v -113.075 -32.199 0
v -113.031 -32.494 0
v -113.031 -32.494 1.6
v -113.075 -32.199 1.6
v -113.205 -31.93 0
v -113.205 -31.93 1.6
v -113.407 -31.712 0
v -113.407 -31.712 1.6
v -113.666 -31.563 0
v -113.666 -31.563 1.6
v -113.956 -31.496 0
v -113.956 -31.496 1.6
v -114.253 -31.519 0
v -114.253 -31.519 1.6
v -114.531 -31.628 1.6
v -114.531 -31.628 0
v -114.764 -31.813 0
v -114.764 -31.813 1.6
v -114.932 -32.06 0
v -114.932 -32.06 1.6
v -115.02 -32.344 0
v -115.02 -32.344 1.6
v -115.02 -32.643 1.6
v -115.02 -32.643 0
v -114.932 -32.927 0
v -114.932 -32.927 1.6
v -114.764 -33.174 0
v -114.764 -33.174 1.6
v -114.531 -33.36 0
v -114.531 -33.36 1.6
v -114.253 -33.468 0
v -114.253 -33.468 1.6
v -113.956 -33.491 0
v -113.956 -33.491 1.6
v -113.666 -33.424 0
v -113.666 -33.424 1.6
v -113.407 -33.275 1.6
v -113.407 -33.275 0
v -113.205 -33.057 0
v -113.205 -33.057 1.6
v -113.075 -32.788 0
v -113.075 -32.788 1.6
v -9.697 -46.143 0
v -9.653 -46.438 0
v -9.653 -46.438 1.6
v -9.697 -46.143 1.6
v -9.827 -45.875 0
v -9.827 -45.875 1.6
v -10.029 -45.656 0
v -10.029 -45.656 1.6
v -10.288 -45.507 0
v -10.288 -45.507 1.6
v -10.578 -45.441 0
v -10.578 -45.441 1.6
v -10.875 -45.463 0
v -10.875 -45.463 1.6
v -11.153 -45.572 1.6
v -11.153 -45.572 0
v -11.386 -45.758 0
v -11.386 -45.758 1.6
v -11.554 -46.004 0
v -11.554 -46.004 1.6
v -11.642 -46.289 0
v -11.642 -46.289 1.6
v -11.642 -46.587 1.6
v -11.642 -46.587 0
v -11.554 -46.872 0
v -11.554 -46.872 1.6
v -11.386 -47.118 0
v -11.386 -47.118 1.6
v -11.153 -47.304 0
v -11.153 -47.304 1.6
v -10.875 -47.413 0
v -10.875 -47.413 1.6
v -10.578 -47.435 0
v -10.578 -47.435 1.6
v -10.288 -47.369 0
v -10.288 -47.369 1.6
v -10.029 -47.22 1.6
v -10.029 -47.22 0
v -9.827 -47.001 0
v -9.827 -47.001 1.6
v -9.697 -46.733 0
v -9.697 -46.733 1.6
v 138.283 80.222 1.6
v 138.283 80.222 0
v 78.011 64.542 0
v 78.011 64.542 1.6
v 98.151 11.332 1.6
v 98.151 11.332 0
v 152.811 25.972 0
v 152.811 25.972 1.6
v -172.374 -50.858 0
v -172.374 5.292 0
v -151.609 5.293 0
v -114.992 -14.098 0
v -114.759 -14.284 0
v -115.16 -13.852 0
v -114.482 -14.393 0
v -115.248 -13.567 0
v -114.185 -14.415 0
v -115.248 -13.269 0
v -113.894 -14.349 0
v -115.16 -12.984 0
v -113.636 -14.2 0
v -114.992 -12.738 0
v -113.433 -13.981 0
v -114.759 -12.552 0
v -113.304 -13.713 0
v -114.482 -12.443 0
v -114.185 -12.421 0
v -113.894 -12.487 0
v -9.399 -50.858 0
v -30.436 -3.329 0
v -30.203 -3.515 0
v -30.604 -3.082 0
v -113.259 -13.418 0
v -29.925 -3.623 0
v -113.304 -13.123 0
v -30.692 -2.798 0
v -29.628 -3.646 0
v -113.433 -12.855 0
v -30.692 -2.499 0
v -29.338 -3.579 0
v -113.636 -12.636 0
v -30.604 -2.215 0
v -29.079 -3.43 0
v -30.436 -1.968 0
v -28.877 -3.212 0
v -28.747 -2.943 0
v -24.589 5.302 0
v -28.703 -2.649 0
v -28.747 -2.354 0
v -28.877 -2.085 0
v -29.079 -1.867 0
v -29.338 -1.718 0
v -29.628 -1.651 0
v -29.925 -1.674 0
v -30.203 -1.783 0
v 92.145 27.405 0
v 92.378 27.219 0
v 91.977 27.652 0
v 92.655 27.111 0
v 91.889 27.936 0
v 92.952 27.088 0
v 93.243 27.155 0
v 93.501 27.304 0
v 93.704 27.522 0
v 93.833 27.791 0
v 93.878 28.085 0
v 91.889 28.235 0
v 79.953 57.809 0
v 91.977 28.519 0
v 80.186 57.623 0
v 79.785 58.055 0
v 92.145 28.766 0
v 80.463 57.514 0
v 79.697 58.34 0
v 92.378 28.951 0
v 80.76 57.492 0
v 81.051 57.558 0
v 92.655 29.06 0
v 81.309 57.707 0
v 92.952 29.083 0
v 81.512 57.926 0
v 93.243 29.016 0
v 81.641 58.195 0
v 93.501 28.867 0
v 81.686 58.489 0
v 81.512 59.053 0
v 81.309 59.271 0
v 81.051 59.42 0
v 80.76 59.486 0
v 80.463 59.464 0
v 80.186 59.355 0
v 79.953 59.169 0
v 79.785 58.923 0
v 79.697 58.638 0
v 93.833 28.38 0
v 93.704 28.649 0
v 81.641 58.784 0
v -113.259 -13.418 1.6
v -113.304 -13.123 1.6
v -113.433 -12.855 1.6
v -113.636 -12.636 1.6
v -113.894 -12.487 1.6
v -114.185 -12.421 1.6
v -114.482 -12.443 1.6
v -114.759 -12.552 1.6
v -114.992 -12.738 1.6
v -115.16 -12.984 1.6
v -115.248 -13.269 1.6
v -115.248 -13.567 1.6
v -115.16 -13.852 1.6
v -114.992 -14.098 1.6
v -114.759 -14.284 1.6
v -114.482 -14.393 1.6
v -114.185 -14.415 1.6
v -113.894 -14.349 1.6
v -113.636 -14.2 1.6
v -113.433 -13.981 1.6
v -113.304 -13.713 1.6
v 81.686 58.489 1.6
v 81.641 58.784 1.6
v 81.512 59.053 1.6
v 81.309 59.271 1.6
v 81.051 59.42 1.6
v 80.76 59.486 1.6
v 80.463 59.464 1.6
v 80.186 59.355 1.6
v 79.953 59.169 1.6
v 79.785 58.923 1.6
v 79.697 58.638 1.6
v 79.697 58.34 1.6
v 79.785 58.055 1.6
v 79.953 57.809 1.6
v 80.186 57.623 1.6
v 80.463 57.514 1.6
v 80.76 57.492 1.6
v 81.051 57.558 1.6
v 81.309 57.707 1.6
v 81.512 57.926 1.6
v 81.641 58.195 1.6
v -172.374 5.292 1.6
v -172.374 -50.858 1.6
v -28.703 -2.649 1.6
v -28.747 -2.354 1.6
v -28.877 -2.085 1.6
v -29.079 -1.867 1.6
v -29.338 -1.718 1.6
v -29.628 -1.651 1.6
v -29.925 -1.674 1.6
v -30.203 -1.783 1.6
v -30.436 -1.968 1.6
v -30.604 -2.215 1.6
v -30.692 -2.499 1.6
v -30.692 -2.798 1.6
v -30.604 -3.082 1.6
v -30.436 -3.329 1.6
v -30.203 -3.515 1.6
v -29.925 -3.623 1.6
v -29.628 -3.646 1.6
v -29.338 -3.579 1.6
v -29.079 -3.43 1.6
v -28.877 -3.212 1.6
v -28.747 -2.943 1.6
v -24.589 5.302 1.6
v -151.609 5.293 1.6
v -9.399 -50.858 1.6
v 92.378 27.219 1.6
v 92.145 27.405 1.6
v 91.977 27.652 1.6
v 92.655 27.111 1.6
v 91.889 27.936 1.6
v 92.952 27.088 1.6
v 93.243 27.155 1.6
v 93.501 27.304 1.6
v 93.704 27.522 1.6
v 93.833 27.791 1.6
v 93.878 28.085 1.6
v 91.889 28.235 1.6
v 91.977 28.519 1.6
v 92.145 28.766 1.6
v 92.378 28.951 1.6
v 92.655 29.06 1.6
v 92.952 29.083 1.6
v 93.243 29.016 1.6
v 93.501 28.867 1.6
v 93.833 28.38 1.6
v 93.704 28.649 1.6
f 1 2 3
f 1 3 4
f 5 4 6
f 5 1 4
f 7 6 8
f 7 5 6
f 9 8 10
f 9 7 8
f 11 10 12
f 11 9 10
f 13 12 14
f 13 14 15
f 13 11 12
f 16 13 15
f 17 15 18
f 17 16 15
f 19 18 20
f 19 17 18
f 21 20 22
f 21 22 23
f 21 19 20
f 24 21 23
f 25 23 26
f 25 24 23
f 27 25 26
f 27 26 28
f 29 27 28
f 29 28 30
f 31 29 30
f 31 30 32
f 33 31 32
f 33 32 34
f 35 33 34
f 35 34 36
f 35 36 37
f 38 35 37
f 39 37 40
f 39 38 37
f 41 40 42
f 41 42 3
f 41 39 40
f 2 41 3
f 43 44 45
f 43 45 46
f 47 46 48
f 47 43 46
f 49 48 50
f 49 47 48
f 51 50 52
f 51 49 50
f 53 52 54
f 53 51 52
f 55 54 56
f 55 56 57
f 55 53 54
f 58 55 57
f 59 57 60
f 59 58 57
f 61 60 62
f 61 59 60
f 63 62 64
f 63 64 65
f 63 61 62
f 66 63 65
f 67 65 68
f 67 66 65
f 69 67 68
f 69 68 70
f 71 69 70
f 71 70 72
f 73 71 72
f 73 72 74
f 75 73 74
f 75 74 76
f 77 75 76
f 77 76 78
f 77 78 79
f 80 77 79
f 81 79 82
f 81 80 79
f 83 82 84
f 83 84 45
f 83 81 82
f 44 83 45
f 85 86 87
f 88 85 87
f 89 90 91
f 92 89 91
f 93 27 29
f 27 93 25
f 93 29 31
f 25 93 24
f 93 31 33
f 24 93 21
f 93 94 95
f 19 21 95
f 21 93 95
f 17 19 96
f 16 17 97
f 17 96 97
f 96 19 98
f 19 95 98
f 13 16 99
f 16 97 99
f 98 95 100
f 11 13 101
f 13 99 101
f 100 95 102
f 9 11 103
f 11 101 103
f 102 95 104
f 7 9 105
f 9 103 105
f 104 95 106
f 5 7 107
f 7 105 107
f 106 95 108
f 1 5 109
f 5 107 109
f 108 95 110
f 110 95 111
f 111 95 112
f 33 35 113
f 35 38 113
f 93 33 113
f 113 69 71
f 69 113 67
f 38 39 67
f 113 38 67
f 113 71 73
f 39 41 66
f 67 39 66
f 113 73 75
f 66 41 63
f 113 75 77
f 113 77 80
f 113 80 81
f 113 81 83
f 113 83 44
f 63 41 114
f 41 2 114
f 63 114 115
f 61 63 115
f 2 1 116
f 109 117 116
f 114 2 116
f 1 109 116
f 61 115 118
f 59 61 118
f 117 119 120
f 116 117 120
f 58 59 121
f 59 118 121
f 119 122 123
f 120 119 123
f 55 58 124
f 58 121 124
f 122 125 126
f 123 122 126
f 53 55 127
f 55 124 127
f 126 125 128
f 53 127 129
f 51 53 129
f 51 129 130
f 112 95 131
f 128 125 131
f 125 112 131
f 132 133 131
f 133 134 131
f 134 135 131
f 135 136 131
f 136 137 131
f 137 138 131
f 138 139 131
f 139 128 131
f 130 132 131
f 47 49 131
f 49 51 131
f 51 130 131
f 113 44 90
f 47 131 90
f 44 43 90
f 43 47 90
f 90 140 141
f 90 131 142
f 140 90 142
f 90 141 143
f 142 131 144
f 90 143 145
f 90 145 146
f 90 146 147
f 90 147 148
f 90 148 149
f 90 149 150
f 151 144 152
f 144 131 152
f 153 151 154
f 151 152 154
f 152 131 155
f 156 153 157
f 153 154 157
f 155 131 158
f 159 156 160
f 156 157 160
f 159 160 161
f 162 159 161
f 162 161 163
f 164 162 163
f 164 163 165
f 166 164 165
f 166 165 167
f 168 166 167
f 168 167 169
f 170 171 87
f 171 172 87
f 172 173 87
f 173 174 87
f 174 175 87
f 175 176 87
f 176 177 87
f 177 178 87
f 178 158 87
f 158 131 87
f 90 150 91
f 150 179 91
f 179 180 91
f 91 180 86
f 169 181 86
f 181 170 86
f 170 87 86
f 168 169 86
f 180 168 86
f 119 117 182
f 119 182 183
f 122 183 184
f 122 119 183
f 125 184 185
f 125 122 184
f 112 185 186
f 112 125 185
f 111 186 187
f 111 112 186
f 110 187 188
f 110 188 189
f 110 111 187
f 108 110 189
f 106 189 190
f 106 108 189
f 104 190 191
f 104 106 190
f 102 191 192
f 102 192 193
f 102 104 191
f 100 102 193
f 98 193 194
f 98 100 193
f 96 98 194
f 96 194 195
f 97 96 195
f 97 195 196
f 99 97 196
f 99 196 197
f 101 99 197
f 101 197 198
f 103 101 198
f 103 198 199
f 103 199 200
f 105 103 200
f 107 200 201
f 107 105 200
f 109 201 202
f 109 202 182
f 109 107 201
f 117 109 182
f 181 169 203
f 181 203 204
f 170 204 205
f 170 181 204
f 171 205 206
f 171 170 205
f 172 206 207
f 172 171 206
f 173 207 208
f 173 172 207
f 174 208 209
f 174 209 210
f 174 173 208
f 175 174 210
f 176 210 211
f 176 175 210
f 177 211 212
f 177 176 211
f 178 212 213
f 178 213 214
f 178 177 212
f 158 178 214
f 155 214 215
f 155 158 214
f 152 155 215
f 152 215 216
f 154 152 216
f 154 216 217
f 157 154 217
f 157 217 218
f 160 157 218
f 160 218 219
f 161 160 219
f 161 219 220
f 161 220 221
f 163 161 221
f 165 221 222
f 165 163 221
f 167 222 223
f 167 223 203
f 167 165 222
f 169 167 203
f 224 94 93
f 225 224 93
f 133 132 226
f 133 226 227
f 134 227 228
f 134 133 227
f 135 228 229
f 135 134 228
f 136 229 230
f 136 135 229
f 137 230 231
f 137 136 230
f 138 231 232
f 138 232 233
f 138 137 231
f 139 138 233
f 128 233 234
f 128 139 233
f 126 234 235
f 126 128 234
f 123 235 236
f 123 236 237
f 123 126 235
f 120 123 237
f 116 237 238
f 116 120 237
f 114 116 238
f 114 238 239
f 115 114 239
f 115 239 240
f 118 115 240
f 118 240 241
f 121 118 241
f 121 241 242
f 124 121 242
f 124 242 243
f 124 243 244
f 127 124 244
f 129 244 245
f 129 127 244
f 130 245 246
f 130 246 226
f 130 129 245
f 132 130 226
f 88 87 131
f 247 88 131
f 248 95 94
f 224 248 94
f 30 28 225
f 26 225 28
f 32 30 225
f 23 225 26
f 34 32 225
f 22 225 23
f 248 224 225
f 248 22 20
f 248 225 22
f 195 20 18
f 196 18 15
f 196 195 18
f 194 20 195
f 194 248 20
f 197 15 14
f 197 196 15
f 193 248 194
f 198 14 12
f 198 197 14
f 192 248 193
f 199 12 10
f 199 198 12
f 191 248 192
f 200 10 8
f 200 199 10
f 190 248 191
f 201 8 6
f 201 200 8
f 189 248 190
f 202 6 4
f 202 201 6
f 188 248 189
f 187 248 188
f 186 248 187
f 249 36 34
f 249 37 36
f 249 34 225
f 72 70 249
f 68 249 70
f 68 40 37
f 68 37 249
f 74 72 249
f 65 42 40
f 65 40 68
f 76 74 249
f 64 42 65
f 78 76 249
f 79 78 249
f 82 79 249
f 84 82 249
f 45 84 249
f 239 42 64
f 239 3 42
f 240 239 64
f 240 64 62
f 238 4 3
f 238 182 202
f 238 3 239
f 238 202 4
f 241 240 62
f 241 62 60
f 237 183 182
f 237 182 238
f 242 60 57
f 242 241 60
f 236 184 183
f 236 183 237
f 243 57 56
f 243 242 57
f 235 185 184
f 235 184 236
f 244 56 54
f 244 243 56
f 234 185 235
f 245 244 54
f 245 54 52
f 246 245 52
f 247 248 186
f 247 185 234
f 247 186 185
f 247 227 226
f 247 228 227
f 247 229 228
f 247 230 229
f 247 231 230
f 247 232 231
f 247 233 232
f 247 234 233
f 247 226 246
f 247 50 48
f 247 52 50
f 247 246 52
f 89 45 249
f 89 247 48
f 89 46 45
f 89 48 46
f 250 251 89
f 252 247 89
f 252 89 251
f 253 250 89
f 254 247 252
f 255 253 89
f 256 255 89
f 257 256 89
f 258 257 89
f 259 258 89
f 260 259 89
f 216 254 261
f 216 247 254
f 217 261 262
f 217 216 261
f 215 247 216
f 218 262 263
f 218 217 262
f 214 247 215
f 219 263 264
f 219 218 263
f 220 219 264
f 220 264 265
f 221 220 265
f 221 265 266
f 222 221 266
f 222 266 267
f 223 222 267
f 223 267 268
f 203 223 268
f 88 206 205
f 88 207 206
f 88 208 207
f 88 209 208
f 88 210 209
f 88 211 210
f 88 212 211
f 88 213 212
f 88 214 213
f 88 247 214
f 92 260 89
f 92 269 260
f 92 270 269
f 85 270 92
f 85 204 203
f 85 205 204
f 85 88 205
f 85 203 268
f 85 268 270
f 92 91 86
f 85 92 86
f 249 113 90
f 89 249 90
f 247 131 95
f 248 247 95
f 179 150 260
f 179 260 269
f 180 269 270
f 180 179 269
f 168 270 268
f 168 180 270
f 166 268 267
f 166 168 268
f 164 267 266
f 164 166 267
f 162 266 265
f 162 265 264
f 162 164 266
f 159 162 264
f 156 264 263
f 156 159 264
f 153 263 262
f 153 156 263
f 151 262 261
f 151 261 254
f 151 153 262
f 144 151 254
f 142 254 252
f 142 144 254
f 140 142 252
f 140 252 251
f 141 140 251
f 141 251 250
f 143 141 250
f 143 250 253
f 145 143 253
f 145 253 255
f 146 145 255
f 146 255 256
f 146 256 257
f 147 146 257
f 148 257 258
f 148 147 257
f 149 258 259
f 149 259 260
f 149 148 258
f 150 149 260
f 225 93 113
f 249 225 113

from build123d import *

# Parameters (mm, degrees)
MODEL_R            = 1
BOSS_EXTRU_1_DEPTH = 1.6


with BuildPart() as part:
    # Model → Boss.-Extru.1 (new body)
    with BuildSketch(Plane.XY):
        Polygon((98.150595456, 11.331634302), (152.811395456, 25.971686302), (138.282595456, 80.221514302), (78.010935456, 64.541586302), (-24.588554544, 5.301674302), (-151.608757489, 5.292943326), (-172.373873722, 5.291515997), (-172.373873722, -50.687645053), (-172.373873722, -50.858487698), (-9.398592544, -50.858487698), align=None)
        with Locations((-114.030844544, -32.493525698)):
            Circle(MODEL_R, mode=Mode.SUBTRACT)
        with Locations((-10.652844544, -46.438125698)):
            Circle(MODEL_R, mode=Mode.SUBTRACT)
        with Locations((-114.259444544, -13.418125698)):
            Circle(MODEL_R, mode=Mode.SUBTRACT)
        with Locations((-29.702844544, -2.648525698)):
            Circle(MODEL_R, mode=Mode.SUBTRACT)
        with Locations((92.877555456, 28.085474302)):
            Circle(MODEL_R, mode=Mode.SUBTRACT)
        with Locations((80.685555456, 58.489274302)):
            Circle(MODEL_R, mode=Mode.SUBTRACT)
    extrude(amount=BOSS_EXTRU_1_DEPTH)


solid = part.part
